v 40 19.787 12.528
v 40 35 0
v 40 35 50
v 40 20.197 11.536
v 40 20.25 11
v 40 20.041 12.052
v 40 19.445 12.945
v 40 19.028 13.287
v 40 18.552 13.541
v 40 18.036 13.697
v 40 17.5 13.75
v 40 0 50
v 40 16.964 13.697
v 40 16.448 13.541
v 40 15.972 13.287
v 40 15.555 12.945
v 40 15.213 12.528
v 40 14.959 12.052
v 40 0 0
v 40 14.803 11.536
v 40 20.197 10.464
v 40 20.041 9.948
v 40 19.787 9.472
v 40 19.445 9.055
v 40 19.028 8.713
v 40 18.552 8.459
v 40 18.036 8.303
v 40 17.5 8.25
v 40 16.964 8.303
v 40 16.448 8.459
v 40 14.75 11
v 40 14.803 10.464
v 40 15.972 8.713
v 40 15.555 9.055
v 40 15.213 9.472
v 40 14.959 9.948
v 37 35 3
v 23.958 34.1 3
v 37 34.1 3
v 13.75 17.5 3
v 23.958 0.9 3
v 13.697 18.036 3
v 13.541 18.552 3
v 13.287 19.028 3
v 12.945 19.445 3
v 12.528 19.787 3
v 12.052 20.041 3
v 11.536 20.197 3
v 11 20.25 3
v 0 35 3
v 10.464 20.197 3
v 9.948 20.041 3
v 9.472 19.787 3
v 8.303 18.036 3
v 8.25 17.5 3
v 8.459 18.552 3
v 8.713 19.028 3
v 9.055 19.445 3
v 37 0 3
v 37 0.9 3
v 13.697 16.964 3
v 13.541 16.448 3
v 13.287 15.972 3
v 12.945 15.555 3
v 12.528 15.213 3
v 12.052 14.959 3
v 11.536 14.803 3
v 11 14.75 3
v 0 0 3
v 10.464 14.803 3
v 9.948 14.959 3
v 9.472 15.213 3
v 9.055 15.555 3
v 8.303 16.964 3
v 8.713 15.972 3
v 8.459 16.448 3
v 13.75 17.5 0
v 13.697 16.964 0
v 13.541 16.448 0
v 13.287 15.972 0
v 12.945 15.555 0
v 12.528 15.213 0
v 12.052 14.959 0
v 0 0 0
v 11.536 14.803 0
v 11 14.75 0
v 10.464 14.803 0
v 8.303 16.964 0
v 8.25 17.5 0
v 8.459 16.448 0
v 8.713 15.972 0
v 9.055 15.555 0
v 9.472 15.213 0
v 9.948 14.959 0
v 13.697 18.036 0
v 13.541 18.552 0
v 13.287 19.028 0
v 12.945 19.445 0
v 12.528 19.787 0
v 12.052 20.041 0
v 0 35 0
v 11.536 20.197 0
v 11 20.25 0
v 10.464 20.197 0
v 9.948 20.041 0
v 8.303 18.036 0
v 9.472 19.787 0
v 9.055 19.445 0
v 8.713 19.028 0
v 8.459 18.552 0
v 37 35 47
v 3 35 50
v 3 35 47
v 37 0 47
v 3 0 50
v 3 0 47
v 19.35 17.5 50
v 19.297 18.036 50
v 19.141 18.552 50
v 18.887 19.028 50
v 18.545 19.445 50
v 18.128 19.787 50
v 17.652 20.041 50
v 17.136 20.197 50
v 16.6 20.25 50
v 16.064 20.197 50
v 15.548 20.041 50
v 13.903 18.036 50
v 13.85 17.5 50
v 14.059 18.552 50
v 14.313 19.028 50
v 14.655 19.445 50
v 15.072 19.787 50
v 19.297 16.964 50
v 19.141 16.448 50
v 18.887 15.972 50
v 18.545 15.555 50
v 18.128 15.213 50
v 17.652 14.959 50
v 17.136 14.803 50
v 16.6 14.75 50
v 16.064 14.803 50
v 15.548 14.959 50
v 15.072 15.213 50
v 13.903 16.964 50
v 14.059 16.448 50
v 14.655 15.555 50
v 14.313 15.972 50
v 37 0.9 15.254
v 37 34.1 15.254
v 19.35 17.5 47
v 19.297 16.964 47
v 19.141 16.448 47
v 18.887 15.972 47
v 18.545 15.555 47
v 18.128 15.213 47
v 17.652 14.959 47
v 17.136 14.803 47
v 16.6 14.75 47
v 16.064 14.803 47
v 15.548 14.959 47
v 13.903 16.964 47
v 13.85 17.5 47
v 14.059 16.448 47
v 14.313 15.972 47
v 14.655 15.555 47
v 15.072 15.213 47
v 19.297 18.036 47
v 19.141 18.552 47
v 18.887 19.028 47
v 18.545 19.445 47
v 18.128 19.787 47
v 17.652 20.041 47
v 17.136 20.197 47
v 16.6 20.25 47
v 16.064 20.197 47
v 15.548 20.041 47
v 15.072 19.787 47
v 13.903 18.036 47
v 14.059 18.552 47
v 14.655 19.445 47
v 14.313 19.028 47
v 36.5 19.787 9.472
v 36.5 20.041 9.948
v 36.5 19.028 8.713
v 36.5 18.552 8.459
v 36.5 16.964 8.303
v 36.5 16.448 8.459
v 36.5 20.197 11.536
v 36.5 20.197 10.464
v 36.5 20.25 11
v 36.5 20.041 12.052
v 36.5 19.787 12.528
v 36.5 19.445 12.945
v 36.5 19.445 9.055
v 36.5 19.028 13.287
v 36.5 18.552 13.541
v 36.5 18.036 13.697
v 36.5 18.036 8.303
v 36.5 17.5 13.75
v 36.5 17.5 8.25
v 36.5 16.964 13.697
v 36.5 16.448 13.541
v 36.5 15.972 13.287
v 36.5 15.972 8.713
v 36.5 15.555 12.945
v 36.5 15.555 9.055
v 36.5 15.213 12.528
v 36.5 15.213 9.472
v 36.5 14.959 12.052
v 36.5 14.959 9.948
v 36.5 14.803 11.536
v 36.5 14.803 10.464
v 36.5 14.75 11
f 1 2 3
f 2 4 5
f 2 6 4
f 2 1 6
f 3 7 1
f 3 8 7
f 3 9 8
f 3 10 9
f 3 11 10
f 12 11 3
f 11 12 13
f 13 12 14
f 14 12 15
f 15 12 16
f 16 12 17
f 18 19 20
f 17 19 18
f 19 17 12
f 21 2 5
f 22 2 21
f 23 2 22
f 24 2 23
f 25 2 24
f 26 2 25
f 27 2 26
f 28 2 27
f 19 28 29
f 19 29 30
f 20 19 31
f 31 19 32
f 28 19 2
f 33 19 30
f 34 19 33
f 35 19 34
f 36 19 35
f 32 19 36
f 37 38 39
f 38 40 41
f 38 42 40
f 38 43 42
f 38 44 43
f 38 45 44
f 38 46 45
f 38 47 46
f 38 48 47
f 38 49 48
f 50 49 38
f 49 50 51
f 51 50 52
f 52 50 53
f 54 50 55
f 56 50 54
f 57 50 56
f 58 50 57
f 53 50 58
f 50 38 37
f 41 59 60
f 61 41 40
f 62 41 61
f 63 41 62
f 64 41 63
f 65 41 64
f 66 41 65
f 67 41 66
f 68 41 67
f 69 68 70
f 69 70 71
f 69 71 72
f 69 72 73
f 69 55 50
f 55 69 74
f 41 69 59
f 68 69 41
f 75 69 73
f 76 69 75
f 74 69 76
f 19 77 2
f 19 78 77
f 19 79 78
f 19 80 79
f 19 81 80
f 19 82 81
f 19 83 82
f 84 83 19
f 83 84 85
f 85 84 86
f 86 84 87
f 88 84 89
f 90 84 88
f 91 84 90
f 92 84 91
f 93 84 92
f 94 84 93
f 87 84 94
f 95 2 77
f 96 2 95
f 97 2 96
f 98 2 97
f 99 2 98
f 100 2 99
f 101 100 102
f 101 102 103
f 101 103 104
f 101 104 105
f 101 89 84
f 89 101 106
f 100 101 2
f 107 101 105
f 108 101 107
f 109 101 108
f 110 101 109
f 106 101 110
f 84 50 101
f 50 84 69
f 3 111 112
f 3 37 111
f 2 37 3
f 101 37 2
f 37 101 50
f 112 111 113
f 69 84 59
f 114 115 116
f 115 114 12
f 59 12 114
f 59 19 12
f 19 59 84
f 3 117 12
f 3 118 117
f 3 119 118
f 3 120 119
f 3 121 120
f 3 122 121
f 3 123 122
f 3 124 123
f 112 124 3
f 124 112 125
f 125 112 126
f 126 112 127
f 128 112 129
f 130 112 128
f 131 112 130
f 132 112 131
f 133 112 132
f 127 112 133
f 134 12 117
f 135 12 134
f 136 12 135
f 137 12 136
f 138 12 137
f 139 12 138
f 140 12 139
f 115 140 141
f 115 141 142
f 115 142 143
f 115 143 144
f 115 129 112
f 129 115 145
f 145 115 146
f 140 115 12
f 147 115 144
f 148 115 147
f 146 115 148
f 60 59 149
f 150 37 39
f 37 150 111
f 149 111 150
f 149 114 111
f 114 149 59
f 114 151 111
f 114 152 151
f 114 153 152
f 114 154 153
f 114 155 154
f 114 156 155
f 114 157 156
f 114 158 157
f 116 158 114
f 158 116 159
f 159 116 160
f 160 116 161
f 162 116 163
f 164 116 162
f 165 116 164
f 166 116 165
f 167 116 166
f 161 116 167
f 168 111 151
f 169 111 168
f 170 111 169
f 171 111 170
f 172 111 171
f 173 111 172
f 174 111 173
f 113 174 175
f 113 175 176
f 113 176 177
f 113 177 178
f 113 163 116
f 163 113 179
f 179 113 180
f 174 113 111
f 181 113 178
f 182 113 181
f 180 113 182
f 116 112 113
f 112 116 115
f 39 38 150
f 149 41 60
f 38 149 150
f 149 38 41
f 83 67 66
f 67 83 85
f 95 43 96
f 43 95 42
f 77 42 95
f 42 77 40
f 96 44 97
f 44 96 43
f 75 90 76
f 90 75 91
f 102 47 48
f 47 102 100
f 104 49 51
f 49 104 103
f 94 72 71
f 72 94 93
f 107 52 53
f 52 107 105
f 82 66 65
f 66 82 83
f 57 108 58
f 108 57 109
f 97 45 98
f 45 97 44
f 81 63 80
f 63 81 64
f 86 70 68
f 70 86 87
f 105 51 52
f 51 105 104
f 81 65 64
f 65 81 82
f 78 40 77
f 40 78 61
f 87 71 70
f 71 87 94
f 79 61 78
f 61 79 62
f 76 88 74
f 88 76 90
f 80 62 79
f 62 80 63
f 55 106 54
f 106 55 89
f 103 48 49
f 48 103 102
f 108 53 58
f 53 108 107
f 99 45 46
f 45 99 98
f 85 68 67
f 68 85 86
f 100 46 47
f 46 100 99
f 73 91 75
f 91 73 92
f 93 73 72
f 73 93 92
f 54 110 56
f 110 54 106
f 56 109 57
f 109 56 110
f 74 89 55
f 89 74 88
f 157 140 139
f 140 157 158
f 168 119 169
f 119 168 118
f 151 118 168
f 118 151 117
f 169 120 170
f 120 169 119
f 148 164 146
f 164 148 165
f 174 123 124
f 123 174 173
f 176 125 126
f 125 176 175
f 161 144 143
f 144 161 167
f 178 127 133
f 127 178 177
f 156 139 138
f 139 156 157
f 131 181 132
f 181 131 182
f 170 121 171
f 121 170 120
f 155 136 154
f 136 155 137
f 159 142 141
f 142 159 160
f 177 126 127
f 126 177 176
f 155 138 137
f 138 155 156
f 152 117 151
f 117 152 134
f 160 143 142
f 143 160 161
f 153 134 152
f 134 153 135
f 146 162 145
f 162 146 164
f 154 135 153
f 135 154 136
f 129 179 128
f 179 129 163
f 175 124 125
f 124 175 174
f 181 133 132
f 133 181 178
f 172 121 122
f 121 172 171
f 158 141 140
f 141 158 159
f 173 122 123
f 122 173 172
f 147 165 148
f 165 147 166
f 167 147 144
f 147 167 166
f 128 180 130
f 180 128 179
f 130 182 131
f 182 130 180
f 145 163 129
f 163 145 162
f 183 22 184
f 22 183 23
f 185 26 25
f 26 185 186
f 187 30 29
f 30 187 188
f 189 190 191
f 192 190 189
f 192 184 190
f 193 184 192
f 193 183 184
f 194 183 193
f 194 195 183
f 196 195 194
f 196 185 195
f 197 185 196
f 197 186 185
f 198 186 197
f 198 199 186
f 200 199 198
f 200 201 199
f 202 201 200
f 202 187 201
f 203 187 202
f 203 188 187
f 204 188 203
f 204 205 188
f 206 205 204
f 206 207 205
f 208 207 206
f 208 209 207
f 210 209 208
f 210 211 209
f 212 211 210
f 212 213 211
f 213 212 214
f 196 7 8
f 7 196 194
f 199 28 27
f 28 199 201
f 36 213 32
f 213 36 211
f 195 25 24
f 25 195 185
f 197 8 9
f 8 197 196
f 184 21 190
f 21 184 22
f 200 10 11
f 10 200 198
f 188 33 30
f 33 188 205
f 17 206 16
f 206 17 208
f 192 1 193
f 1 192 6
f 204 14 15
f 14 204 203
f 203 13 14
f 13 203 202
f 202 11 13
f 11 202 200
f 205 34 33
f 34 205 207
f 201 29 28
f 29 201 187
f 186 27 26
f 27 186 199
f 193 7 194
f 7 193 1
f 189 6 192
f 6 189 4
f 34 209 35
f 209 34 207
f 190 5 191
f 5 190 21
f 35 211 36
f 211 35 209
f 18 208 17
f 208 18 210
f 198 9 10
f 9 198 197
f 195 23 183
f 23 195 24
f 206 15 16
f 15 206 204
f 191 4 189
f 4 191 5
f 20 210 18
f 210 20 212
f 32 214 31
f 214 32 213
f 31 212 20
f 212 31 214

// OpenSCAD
$fn = 32;

// ----------------------------------------------------------------------
// Z-bracket: 40 x 35 x 50 mm
// ----------------------------------------------------------------------

// --- parameters (mm) ---
lower_len = 40;           // lower foot length, X
upper_len = 34;           // upper foot length, X
width = 35;               // bracket width, Y
rise = 50;                // overall rise, Z
thick = 3;                // plate thickness
hole_d = 5.5;             // clearance for M5
rib_len = 14;             // gusset leg
rib_sink = 0.9;           // gusset overlap into the plates

module hole_z(px, py, z0) {
  translate([px, py, z0 - 0.5]) cylinder(h = thick + 1, d = hole_d);
}
module hole_x(py, pz) {
  translate([-0.5, py, pz]) rotate([0, 90, 0]) cylinder(h = thick + 1, d = hole_d);
}
module gusset(x0) {
  translate([x0, width - rib_sink, 0])
    rotate([90, 0, 0])
      linear_extrude(height = width - 2 * rib_sink)
        polygon(points = [[rib_sink, thick - rib_sink],
                          [rib_sink, thick - rib_sink + rib_len],
                          [-rib_len, thick - rib_sink]]);
}

difference() {
  union() {
    cube([lower_len, width, thick]);
    /* web, overlapping the lower foot */
    translate([lower_len - thick, 0, 0]) cube([thick, width, rise]);
    /* upper foot, sunk into the web */
    translate([lower_len - thick - upper_len, 0, rise - thick]) cube([upper_len + thick, width, thick]);
    gusset(lower_len - thick);
  }
  hole_z(11, 17.5, 0);
  translate([lower_len - thick - 20.4, 0, 0]) hole_z(0, 17.5, rise - thick);
  translate([lower_len - thick, 0, 0]) hole_x(17.5, 11);
}
